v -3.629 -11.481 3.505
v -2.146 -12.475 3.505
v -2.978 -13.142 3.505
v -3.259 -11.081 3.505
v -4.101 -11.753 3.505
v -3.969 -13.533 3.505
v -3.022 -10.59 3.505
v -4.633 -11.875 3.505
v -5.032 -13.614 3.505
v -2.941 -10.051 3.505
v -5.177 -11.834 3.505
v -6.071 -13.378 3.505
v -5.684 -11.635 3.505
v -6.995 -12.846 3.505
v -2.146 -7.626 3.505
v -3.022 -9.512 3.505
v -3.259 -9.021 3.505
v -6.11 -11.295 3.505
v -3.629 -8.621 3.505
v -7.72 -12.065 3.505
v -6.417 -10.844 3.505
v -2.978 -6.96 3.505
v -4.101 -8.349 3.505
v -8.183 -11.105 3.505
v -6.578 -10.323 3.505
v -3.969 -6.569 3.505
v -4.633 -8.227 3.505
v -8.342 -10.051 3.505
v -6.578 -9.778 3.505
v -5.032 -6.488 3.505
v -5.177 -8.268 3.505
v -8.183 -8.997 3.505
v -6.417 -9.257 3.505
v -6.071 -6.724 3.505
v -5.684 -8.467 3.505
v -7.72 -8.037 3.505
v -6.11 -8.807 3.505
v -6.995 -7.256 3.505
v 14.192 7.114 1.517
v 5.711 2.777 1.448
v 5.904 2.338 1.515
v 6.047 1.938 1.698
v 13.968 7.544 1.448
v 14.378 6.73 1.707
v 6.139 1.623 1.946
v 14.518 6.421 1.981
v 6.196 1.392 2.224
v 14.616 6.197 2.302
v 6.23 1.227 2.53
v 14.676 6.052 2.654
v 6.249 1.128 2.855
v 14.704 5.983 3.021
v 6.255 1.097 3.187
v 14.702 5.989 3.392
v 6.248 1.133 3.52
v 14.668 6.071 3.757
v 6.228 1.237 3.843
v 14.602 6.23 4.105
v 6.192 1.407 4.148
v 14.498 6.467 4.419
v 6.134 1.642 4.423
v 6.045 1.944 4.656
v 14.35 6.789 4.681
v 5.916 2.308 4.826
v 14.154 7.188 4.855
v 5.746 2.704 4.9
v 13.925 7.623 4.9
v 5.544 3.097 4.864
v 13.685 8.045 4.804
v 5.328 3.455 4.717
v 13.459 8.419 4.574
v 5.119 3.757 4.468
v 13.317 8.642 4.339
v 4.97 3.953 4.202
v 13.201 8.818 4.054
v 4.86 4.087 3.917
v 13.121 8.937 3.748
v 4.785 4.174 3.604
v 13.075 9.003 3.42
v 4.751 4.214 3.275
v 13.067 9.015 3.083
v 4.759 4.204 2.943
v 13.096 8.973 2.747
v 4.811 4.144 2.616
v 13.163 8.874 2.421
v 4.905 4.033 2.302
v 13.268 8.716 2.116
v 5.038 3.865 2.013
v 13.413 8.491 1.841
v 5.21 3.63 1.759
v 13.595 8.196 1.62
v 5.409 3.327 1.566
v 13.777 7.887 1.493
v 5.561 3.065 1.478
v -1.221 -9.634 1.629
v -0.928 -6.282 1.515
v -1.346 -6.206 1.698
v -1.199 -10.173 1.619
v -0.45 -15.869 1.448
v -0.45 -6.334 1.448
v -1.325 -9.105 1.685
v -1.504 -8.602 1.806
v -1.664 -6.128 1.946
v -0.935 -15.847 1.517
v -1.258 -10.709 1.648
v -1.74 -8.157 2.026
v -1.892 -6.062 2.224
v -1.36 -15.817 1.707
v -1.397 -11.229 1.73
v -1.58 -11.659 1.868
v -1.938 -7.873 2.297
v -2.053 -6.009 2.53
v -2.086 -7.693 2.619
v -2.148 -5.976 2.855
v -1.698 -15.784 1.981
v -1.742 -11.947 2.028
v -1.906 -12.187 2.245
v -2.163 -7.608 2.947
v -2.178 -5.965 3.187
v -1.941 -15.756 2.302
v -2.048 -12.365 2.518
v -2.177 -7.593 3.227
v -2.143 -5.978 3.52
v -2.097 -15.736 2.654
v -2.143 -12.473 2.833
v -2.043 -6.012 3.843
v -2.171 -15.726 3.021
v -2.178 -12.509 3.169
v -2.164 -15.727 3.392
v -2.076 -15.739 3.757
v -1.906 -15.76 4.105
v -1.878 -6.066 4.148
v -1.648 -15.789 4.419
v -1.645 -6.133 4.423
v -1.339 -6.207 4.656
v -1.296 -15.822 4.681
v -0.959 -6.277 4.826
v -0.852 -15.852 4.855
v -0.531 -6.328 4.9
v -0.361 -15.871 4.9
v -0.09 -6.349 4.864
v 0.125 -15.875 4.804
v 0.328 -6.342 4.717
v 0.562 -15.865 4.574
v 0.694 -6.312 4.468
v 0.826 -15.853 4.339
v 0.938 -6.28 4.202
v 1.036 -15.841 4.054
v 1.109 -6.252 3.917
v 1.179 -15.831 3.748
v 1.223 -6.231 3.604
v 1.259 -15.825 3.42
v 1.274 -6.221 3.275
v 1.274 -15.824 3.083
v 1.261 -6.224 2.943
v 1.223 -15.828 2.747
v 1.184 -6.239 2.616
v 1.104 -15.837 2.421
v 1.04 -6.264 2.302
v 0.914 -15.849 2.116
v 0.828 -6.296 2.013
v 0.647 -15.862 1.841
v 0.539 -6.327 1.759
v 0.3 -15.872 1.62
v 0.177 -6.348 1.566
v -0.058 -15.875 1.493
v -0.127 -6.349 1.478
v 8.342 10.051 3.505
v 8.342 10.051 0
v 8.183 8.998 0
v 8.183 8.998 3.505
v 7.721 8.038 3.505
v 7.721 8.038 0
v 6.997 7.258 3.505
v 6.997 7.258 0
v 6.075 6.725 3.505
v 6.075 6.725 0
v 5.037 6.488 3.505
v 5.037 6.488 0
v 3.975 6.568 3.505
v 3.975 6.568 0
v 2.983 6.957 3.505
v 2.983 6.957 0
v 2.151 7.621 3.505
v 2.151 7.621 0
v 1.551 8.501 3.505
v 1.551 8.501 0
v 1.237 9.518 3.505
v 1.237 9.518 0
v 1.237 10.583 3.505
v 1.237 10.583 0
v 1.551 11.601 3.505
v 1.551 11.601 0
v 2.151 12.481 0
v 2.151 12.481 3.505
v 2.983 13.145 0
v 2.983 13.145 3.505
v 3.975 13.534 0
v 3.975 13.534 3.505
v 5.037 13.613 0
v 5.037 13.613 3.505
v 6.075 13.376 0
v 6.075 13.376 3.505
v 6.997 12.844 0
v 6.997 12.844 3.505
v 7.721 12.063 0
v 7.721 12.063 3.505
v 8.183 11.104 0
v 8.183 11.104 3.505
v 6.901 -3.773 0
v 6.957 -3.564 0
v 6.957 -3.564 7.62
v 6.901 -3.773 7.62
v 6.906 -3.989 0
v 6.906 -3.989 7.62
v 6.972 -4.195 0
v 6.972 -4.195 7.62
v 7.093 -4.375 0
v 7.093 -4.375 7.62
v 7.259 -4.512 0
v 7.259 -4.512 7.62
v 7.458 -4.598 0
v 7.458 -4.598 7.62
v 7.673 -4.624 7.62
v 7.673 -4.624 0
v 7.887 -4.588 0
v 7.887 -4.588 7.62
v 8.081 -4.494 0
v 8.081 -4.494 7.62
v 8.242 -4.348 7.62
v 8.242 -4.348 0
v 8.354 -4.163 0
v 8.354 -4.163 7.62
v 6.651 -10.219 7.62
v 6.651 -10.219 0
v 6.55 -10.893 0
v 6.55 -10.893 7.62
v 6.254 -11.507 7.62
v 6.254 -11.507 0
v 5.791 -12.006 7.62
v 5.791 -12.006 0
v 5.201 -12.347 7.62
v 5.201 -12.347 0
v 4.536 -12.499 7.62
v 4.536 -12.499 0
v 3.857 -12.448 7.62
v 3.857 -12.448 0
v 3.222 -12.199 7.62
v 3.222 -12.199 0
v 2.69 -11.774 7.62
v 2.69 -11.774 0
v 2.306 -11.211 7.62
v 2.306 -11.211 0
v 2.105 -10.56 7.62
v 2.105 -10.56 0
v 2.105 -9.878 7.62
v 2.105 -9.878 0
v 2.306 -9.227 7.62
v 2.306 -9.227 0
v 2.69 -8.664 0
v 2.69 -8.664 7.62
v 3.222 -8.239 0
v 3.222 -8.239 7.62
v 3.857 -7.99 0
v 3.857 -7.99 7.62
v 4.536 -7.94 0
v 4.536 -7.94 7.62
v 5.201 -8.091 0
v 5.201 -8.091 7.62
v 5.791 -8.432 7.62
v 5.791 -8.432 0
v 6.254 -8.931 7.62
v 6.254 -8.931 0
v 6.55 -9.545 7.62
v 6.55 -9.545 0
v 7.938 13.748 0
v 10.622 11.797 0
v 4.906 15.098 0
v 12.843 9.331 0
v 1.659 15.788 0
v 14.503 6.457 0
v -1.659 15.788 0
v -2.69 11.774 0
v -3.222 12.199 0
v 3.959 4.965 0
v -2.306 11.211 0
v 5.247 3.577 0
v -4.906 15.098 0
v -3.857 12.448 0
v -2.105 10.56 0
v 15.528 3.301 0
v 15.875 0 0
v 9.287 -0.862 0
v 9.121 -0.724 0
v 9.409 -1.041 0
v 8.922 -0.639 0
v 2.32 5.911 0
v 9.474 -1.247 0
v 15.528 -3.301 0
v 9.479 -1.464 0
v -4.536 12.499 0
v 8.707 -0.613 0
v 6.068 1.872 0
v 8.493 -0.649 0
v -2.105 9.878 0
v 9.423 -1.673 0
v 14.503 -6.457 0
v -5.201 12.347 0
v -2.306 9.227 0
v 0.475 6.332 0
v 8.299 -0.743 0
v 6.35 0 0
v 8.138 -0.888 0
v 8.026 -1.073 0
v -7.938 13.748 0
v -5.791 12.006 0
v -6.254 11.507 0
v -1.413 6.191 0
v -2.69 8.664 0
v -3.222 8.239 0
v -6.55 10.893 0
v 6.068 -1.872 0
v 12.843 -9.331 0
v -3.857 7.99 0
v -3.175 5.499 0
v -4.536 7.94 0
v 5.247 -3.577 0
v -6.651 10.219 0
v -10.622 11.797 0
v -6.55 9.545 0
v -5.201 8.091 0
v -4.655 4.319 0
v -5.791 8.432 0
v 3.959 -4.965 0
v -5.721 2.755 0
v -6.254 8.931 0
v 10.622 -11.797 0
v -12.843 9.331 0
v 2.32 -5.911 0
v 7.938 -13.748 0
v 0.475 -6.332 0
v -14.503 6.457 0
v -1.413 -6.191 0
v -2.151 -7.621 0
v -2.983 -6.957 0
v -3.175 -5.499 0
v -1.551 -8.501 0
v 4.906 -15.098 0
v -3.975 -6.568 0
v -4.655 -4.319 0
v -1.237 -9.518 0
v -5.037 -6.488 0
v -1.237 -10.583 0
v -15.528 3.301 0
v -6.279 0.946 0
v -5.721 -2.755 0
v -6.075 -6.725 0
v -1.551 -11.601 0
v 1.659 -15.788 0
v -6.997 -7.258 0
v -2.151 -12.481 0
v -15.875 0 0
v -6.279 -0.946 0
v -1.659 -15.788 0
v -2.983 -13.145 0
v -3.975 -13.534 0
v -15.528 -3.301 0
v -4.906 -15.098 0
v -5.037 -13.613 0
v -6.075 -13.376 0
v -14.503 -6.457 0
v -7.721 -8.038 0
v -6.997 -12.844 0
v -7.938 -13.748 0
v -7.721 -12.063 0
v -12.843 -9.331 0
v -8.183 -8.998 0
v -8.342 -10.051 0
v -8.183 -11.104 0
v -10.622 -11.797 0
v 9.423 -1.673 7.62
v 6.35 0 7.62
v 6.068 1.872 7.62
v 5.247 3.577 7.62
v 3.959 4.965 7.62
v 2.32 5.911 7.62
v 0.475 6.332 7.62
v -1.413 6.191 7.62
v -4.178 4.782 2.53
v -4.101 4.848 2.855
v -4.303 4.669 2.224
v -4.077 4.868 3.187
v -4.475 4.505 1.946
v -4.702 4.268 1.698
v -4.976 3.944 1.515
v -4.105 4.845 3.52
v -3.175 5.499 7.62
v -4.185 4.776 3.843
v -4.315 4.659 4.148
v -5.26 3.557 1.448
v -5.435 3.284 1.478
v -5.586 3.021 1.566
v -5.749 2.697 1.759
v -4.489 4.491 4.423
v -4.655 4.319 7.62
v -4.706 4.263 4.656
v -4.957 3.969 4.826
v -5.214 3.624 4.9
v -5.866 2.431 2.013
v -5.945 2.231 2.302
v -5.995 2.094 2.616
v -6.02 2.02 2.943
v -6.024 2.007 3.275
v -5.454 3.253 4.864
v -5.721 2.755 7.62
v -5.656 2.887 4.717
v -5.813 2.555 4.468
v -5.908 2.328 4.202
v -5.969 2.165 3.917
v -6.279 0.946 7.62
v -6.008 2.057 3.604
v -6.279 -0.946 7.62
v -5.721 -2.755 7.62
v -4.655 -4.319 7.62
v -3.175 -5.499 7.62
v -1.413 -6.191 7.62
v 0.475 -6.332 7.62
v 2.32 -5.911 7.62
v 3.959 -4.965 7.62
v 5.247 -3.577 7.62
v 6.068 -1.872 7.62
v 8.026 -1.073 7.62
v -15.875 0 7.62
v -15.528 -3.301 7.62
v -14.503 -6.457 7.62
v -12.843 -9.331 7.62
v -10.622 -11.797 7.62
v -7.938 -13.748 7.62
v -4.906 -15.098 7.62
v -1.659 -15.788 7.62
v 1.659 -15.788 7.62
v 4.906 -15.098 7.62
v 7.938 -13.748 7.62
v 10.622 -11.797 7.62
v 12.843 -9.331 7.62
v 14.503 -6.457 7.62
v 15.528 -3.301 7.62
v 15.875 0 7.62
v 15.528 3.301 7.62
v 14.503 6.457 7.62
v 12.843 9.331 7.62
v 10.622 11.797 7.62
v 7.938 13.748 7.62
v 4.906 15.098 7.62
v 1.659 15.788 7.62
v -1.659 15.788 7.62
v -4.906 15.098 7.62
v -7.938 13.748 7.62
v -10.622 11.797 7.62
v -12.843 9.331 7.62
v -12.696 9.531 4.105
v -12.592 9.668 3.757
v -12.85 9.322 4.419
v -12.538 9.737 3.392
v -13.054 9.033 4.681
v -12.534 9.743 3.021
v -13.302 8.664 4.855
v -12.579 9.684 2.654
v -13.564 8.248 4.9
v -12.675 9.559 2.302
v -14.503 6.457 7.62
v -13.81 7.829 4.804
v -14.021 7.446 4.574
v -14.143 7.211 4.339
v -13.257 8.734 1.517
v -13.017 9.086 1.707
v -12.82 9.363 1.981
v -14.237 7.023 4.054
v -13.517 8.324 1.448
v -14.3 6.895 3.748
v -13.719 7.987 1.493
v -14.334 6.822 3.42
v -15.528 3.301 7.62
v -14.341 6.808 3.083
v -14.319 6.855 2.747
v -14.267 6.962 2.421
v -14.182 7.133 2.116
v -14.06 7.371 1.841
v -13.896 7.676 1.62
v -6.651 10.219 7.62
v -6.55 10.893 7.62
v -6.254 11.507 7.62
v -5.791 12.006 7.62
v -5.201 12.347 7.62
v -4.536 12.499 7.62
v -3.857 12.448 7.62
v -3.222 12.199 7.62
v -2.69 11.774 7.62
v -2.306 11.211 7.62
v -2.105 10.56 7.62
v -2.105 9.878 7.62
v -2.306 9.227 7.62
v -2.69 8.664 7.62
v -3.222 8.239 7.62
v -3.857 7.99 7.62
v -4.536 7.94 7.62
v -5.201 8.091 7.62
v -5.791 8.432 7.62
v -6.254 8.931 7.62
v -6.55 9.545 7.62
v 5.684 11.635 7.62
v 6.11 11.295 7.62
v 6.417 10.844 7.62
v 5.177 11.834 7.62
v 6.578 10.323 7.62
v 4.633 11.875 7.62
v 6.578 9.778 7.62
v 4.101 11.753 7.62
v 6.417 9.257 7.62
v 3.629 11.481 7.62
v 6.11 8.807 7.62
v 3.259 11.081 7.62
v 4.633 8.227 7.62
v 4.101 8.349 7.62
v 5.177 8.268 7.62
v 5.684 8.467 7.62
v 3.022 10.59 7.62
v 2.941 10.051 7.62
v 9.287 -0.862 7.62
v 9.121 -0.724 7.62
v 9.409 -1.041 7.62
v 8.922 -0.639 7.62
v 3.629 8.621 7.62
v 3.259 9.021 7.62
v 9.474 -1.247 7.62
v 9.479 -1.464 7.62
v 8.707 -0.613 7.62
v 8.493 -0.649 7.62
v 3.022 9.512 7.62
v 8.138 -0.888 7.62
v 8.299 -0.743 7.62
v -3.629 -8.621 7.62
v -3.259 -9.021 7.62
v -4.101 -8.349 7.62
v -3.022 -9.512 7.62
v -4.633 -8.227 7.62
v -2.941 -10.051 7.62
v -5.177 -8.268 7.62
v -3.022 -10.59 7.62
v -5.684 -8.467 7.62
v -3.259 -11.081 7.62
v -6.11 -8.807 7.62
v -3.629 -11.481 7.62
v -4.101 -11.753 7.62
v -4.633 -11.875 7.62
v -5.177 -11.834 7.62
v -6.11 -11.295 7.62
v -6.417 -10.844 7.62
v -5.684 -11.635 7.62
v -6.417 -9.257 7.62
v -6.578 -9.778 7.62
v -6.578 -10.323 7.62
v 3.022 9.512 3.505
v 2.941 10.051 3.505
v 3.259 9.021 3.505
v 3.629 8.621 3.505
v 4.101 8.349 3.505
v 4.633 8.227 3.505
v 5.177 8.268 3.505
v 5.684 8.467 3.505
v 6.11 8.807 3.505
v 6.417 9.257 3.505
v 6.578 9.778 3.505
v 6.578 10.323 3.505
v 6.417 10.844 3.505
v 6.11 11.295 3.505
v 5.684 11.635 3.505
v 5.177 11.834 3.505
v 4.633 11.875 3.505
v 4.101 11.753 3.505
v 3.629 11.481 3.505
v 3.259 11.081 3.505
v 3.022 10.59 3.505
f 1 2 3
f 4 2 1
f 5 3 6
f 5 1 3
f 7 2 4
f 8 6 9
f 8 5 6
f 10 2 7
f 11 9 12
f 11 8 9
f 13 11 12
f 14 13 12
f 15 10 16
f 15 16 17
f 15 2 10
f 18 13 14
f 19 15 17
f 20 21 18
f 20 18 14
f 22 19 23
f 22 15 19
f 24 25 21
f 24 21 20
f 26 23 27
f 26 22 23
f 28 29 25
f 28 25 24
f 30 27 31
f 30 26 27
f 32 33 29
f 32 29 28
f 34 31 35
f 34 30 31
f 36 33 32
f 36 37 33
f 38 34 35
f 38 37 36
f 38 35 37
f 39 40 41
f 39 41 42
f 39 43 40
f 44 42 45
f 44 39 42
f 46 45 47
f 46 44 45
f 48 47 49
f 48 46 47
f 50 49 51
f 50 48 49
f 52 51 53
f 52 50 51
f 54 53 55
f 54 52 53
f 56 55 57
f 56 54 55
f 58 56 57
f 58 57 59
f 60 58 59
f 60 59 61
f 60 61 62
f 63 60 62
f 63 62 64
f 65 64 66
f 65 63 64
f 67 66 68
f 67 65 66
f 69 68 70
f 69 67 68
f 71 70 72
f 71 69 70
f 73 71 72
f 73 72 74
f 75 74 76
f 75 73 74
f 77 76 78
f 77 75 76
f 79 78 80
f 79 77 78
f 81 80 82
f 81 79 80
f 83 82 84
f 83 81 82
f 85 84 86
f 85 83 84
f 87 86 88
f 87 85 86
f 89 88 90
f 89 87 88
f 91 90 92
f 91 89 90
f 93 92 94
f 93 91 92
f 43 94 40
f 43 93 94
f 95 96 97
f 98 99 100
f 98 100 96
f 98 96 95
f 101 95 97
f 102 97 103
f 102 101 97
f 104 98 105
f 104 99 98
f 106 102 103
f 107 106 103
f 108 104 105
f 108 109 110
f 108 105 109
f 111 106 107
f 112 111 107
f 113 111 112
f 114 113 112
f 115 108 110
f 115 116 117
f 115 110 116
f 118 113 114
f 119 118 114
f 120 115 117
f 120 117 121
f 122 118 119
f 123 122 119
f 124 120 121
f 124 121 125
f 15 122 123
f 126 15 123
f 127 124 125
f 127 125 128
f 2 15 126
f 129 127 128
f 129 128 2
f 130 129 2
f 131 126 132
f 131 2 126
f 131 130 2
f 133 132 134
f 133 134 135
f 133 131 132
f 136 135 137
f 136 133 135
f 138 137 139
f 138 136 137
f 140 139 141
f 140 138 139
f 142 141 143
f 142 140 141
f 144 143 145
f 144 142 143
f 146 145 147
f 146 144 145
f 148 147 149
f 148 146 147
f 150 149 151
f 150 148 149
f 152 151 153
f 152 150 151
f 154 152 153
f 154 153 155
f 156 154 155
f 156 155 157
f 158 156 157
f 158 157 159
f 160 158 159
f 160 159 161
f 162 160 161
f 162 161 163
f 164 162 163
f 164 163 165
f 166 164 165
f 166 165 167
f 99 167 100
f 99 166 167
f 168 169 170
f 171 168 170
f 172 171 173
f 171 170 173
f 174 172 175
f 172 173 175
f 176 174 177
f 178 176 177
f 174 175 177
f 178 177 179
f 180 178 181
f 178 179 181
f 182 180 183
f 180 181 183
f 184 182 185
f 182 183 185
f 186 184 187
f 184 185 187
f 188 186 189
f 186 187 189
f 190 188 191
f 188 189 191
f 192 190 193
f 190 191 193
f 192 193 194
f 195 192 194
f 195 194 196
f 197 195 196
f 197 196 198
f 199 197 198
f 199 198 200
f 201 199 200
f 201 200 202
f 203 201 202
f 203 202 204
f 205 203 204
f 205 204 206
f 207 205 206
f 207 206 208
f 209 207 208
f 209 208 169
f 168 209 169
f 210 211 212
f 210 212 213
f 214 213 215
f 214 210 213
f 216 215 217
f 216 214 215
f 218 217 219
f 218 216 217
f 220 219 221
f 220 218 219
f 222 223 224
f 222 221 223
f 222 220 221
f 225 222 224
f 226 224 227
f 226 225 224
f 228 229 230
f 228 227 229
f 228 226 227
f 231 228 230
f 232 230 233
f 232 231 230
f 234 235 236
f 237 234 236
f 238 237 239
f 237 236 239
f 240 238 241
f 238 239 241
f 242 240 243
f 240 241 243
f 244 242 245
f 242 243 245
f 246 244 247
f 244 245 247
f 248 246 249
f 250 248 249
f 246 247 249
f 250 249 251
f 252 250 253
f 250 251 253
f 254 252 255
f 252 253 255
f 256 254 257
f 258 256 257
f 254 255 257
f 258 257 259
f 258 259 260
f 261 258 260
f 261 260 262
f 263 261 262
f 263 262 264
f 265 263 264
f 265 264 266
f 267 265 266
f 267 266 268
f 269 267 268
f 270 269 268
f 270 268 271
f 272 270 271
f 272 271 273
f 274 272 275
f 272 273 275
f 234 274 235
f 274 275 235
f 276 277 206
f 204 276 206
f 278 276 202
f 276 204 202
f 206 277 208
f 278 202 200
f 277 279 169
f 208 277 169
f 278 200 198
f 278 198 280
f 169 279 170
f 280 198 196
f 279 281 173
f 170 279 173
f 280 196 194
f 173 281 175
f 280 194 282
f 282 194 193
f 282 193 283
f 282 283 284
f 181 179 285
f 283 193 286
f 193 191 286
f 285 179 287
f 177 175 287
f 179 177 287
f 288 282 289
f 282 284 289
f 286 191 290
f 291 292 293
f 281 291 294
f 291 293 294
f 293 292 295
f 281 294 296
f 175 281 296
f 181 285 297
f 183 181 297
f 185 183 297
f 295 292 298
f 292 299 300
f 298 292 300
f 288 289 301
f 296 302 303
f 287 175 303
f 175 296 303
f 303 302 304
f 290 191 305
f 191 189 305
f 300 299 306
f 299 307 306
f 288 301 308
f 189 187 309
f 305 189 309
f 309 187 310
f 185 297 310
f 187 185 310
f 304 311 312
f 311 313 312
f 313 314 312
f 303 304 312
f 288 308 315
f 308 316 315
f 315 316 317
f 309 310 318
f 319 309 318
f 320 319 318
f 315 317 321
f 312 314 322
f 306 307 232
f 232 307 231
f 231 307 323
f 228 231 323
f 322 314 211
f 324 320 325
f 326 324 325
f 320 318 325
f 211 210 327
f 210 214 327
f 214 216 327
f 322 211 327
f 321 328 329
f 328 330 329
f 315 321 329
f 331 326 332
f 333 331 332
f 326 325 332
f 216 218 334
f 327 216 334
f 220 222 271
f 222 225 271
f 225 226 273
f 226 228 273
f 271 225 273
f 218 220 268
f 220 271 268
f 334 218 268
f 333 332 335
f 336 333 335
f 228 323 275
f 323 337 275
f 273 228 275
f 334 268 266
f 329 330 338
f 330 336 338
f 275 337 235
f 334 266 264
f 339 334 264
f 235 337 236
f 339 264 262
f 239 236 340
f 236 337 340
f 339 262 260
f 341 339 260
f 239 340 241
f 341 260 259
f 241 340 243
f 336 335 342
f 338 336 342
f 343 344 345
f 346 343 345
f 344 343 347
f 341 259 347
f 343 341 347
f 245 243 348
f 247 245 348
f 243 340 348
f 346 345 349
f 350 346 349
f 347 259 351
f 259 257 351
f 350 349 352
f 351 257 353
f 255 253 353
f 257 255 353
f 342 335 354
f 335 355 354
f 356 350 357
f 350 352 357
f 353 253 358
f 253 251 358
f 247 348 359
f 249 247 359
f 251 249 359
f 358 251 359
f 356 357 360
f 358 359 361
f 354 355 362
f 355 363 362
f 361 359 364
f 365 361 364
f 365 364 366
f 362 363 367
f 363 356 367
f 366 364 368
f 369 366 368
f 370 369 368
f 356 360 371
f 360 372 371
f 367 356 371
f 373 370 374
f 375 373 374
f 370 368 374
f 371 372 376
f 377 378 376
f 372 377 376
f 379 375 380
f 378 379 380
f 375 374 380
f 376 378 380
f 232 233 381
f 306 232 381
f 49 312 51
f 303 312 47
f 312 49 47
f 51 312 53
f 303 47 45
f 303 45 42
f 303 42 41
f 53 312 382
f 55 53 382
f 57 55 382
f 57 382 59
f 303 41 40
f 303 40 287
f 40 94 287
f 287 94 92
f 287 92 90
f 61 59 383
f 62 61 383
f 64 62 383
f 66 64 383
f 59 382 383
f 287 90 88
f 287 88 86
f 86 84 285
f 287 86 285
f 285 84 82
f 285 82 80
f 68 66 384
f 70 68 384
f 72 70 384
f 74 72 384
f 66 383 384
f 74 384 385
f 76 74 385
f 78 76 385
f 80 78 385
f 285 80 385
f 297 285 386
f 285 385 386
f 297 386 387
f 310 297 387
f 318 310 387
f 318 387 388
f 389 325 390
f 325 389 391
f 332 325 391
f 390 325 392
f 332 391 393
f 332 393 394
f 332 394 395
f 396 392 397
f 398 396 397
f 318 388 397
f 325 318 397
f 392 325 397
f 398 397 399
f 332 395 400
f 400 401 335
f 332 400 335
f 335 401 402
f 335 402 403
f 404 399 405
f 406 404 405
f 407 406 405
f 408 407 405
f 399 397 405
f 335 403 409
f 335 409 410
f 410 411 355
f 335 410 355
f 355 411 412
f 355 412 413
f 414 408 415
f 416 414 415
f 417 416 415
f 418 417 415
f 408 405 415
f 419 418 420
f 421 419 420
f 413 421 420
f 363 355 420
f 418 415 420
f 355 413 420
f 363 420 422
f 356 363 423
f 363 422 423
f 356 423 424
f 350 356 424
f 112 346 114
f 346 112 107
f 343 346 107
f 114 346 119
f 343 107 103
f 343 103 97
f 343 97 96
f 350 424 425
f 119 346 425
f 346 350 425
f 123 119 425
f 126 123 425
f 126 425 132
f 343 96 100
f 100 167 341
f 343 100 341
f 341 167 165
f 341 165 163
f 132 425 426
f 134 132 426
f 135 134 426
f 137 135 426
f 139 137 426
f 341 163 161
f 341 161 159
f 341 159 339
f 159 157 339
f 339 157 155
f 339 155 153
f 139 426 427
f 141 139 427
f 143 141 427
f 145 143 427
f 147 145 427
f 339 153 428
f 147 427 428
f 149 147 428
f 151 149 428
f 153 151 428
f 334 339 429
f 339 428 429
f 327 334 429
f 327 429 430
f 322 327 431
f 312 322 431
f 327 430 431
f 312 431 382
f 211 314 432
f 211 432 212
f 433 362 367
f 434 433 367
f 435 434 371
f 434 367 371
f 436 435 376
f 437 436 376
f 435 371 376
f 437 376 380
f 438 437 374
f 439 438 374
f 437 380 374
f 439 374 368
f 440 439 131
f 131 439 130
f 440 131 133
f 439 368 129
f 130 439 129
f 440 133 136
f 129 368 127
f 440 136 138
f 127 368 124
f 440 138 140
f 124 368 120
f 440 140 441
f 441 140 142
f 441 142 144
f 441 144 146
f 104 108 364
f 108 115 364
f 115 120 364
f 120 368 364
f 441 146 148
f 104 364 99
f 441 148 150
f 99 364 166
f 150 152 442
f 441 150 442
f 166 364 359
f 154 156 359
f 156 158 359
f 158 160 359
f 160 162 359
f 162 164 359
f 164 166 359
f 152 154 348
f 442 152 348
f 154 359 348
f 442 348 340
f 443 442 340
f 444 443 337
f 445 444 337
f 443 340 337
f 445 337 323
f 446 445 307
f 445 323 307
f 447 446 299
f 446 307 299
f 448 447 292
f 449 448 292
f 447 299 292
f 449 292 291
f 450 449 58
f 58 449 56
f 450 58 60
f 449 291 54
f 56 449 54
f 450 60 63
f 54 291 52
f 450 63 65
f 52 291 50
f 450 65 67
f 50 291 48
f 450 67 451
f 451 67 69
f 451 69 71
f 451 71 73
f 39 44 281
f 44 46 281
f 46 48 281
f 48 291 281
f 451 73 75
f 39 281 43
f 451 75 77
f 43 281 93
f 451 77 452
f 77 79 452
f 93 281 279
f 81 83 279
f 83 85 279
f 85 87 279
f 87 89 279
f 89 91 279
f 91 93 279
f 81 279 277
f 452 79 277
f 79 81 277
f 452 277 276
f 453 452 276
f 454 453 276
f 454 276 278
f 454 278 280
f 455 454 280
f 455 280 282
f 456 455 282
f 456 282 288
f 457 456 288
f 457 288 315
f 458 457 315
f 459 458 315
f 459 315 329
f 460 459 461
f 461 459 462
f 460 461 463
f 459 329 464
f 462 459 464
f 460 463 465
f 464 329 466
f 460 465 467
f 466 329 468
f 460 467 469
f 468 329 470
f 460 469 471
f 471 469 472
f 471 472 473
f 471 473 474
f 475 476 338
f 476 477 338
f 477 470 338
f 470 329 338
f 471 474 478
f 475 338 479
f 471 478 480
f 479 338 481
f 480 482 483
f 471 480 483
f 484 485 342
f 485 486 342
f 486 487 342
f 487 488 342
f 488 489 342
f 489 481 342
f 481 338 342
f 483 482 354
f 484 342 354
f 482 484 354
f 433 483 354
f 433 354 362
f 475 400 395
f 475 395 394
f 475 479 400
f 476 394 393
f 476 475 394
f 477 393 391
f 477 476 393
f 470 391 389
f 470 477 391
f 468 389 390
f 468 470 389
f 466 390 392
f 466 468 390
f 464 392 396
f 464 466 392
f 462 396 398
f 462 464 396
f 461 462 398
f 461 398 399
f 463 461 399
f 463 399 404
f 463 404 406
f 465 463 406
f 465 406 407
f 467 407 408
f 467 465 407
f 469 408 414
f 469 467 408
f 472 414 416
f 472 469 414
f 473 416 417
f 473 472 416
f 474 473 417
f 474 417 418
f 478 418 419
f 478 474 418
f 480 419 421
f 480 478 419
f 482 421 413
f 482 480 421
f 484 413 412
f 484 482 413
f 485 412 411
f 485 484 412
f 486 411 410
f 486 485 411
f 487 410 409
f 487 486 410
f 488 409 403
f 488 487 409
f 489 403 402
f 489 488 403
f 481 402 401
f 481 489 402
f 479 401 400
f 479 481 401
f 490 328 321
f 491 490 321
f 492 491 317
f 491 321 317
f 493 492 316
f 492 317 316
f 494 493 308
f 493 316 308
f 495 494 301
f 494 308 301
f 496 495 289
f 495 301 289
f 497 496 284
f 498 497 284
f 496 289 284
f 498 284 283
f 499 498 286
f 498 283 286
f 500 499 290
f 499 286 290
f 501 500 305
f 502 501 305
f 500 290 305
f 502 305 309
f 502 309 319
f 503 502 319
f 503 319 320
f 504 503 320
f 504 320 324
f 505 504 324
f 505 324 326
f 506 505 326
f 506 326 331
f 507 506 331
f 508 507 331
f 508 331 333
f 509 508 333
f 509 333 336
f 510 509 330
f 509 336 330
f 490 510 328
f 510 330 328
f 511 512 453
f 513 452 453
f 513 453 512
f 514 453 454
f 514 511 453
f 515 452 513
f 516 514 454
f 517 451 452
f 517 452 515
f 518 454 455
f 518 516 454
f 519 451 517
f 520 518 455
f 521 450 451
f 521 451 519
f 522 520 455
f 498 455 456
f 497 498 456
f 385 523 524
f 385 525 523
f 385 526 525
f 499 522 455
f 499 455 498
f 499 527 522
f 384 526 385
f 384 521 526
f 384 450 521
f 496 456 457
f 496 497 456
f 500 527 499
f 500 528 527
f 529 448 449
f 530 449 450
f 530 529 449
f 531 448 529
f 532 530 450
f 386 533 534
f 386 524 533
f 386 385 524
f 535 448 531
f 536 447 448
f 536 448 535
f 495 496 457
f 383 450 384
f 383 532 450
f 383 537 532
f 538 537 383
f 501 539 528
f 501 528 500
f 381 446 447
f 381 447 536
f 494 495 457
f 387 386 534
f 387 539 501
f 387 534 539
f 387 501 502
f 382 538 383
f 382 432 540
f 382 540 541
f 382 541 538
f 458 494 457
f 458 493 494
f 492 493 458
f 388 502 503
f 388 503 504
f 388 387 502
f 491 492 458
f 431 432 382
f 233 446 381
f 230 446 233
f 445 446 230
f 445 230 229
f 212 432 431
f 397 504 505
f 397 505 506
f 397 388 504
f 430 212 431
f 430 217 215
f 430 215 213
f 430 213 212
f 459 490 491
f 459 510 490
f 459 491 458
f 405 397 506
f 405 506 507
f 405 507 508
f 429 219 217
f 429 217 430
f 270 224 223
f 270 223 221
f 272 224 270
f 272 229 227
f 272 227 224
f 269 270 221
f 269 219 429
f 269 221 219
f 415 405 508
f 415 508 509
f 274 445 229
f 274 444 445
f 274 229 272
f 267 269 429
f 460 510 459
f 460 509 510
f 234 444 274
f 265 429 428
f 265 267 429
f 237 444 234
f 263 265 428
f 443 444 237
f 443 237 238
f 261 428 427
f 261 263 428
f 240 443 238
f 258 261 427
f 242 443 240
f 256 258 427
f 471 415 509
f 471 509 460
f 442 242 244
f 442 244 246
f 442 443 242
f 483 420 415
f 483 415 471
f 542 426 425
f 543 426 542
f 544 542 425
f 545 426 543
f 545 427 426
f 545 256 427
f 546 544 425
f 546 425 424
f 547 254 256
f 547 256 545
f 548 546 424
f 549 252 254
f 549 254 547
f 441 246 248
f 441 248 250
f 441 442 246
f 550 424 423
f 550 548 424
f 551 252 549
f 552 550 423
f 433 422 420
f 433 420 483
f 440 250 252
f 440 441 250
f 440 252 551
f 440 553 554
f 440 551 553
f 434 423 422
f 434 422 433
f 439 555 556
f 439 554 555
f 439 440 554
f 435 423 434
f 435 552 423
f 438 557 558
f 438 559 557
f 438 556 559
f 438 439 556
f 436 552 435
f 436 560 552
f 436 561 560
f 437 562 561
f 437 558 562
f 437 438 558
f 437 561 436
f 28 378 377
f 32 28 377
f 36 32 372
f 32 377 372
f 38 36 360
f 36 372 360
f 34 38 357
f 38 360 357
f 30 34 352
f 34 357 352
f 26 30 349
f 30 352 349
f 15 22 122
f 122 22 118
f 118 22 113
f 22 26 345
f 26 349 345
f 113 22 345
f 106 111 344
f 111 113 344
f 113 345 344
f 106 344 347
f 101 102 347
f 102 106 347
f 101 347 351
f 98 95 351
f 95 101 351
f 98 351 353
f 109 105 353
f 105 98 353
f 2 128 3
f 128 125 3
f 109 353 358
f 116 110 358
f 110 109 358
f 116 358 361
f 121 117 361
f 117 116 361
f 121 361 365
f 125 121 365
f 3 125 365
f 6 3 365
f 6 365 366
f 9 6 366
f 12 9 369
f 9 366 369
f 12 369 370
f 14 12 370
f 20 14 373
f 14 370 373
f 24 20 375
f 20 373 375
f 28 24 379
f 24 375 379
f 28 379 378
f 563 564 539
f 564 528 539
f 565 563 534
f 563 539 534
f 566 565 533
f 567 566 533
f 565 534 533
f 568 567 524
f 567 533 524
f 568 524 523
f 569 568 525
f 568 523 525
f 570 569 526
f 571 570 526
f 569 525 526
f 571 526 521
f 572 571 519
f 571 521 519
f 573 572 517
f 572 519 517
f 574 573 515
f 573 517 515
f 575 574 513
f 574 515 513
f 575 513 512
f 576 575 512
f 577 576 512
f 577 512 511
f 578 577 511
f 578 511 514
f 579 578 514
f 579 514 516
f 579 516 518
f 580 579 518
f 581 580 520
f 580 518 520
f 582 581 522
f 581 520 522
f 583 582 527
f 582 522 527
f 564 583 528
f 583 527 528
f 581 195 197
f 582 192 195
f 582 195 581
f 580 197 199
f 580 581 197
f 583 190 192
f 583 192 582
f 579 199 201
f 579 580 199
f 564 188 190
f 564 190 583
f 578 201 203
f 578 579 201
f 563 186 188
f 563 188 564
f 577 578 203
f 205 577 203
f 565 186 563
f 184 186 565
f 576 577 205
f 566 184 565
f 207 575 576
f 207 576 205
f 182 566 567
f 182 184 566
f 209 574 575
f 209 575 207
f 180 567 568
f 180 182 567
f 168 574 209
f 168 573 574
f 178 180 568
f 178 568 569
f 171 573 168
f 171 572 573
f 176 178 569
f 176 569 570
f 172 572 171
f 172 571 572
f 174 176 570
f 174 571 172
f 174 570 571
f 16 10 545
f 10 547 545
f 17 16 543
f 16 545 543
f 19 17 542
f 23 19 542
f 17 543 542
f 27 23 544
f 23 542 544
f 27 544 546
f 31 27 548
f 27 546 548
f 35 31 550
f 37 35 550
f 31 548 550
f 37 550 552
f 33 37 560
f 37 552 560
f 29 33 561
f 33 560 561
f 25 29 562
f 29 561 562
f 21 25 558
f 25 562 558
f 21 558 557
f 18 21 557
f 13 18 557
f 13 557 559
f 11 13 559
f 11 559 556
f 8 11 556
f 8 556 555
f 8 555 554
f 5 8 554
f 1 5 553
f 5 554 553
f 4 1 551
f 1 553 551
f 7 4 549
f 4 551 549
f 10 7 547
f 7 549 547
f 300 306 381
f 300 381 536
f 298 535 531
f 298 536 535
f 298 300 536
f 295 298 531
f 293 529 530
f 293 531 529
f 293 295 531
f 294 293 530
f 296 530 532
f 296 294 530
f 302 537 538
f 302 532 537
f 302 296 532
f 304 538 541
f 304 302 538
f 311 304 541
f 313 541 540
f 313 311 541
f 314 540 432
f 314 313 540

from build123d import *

# Parameters (mm, degrees)
SKETCH1_R                                      = 15.875
BOSS_EXTRUDE1_DEPTH                            = 7.62
SKETCH2_R                                      = 6.35
CUT_EXTRUDE1_DEPTH                             = 24.708556472
CIRPATTERN1_COUNT                              = 3
CBORE_FOR_6_SOCKET_HEAD_CAP_SCREW1_D           = 3.6576
CBORE_FOR_6_SOCKET_HEAD_CAP_SCREW1_CBORE_D     = 7.14502
CBORE_FOR_6_SOCKET_HEAD_CAP_SCREW1_CBORE_DEPTH = 3.5052
CIRPATTERN2_COUNT                              = 2
SKETCH42_R                                     = 2.286
CUT_EXTRUDE2_DEPTH                             = 7.62
CIRPATTERN3_COUNT                              = 2
CUT_EXTRUDE3_DEPTH                             = 24.70855664


with BuildPart() as part:
    # Sketch1 → Boss-Extrude1 (new body)
    with BuildSketch(Plane.XY):
        with Locations(Location((0, 0, 0), (0, 0, 180))):
            Circle(SKETCH1_R)
    extrude(amount=BOSS_EXTRUDE1_DEPTH)

    # Sketch2 → Cut-Extrude1 (cut, through all)
    with BuildSketch(Plane.XY.offset(7.62)):
        Circle(SKETCH2_R)
    extrude(amount=-CUT_EXTRUDE1_DEPTH, mode=Mode.SUBTRACT)

    # Sketch36 → Tap Drill for #8-32 Tap1 (revolve, cut)
    with BuildSketch(Plane(origin=(-0.450397279, -15.875, 3.175), x_dir=(0, 0, -1), z_dir=(1, 0, 0))):
        Polygon((0, 0), (0, 20.499292883), (1.7272, 19.05), (1.7272, 0), align=None)
    tap_drill_for_8_32_tap1 = revolve(axis=Axis((-0.450397279, -22.225, 3.175), (0, 1, 0)), mode=Mode.SUBTRACT)

    # CirPattern1: Tap Drill for #8-32 Tap1 ×3 about axis
    cirpattern1_axis = Axis((0, 0, 7.62), (0, 0, -1))
    for i in range(1, CIRPATTERN1_COUNT):
        add(tap_drill_for_8_32_tap1.rotate(cirpattern1_axis, i * 360 / CIRPATTERN1_COUNT), mode=Mode.SUBTRACT)

    # CBORE for #6 Socket Head Cap Screw1 (through all)
    with Locations(Plane(origin=(0, 0, 0), x_dir=(-1, 0, 0), z_dir=(0, 0, -1))):
        with Locations((4.769587089, -10.050926029)):
            cbore_for_6_socket_head_cap_screw1 = CounterBoreHole(CBORE_FOR_6_SOCKET_HEAD_CAP_SCREW1_D / 2, CBORE_FOR_6_SOCKET_HEAD_CAP_SCREW1_CBORE_D / 2, CBORE_FOR_6_SOCKET_HEAD_CAP_SCREW1_CBORE_DEPTH)

    # CirPattern2: CBORE for #6 Socket Head Cap Screw1 ×2 about axis
    cirpattern2_axis = Axis((0, 0, 0), (0, 0, 1))
    for i in range(1, CIRPATTERN2_COUNT):
        add(cbore_for_6_socket_head_cap_screw1.rotate(cirpattern2_axis, i * 360 / CIRPATTERN2_COUNT), mode=Mode.SUBTRACT)

    # Sketch42 → Cut-Extrude2 (cut)
    with BuildSketch(Plane(origin=(0, 0, 0), x_dir=(-1, 0, 0), z_dir=(0, 0, -1))):
        with Locations((4.365368762, 10.219159056)):
            Circle(SKETCH42_R)
    cut_extrude2 = extrude(amount=-CUT_EXTRUDE2_DEPTH, mode=Mode.SUBTRACT)

    # CirPattern3: Cut-Extrude2 ×2 about axis
    cirpattern3_axis = Axis((0, 0, 0), (0, 0, 1))
    for i in range(1, CIRPATTERN3_COUNT):
        add(cut_extrude2.rotate(cirpattern3_axis, i * 360 / CIRPATTERN3_COUNT), mode=Mode.SUBTRACT)

    # Sketch43 → Cut-Extrude3 (cut, through all)
    with BuildSketch(Plane(origin=(0, 0, 0), x_dir=(-1, 0, 0), z_dir=(0, 0, -1))):
        with BuildLine():
            Line((-8.025711128, -1.073137194), (-6.956985206, -3.563699487))
            ThreePointArc((-6.956985206, -3.563699487), (-7.355887027, -4.562271884), (-8.354459424, -4.163370063))
            Line((-8.354459424, -4.163370063), (-9.423185347, -1.67280777))
            ThreePointArc((-9.423185347, -1.67280777), (-9.024283525, -0.674235373), (-8.025711128, -1.073137194))
        make_face()
    extrude(amount=-CUT_EXTRUDE3_DEPTH, mode=Mode.SUBTRACT)


solid = part.part
